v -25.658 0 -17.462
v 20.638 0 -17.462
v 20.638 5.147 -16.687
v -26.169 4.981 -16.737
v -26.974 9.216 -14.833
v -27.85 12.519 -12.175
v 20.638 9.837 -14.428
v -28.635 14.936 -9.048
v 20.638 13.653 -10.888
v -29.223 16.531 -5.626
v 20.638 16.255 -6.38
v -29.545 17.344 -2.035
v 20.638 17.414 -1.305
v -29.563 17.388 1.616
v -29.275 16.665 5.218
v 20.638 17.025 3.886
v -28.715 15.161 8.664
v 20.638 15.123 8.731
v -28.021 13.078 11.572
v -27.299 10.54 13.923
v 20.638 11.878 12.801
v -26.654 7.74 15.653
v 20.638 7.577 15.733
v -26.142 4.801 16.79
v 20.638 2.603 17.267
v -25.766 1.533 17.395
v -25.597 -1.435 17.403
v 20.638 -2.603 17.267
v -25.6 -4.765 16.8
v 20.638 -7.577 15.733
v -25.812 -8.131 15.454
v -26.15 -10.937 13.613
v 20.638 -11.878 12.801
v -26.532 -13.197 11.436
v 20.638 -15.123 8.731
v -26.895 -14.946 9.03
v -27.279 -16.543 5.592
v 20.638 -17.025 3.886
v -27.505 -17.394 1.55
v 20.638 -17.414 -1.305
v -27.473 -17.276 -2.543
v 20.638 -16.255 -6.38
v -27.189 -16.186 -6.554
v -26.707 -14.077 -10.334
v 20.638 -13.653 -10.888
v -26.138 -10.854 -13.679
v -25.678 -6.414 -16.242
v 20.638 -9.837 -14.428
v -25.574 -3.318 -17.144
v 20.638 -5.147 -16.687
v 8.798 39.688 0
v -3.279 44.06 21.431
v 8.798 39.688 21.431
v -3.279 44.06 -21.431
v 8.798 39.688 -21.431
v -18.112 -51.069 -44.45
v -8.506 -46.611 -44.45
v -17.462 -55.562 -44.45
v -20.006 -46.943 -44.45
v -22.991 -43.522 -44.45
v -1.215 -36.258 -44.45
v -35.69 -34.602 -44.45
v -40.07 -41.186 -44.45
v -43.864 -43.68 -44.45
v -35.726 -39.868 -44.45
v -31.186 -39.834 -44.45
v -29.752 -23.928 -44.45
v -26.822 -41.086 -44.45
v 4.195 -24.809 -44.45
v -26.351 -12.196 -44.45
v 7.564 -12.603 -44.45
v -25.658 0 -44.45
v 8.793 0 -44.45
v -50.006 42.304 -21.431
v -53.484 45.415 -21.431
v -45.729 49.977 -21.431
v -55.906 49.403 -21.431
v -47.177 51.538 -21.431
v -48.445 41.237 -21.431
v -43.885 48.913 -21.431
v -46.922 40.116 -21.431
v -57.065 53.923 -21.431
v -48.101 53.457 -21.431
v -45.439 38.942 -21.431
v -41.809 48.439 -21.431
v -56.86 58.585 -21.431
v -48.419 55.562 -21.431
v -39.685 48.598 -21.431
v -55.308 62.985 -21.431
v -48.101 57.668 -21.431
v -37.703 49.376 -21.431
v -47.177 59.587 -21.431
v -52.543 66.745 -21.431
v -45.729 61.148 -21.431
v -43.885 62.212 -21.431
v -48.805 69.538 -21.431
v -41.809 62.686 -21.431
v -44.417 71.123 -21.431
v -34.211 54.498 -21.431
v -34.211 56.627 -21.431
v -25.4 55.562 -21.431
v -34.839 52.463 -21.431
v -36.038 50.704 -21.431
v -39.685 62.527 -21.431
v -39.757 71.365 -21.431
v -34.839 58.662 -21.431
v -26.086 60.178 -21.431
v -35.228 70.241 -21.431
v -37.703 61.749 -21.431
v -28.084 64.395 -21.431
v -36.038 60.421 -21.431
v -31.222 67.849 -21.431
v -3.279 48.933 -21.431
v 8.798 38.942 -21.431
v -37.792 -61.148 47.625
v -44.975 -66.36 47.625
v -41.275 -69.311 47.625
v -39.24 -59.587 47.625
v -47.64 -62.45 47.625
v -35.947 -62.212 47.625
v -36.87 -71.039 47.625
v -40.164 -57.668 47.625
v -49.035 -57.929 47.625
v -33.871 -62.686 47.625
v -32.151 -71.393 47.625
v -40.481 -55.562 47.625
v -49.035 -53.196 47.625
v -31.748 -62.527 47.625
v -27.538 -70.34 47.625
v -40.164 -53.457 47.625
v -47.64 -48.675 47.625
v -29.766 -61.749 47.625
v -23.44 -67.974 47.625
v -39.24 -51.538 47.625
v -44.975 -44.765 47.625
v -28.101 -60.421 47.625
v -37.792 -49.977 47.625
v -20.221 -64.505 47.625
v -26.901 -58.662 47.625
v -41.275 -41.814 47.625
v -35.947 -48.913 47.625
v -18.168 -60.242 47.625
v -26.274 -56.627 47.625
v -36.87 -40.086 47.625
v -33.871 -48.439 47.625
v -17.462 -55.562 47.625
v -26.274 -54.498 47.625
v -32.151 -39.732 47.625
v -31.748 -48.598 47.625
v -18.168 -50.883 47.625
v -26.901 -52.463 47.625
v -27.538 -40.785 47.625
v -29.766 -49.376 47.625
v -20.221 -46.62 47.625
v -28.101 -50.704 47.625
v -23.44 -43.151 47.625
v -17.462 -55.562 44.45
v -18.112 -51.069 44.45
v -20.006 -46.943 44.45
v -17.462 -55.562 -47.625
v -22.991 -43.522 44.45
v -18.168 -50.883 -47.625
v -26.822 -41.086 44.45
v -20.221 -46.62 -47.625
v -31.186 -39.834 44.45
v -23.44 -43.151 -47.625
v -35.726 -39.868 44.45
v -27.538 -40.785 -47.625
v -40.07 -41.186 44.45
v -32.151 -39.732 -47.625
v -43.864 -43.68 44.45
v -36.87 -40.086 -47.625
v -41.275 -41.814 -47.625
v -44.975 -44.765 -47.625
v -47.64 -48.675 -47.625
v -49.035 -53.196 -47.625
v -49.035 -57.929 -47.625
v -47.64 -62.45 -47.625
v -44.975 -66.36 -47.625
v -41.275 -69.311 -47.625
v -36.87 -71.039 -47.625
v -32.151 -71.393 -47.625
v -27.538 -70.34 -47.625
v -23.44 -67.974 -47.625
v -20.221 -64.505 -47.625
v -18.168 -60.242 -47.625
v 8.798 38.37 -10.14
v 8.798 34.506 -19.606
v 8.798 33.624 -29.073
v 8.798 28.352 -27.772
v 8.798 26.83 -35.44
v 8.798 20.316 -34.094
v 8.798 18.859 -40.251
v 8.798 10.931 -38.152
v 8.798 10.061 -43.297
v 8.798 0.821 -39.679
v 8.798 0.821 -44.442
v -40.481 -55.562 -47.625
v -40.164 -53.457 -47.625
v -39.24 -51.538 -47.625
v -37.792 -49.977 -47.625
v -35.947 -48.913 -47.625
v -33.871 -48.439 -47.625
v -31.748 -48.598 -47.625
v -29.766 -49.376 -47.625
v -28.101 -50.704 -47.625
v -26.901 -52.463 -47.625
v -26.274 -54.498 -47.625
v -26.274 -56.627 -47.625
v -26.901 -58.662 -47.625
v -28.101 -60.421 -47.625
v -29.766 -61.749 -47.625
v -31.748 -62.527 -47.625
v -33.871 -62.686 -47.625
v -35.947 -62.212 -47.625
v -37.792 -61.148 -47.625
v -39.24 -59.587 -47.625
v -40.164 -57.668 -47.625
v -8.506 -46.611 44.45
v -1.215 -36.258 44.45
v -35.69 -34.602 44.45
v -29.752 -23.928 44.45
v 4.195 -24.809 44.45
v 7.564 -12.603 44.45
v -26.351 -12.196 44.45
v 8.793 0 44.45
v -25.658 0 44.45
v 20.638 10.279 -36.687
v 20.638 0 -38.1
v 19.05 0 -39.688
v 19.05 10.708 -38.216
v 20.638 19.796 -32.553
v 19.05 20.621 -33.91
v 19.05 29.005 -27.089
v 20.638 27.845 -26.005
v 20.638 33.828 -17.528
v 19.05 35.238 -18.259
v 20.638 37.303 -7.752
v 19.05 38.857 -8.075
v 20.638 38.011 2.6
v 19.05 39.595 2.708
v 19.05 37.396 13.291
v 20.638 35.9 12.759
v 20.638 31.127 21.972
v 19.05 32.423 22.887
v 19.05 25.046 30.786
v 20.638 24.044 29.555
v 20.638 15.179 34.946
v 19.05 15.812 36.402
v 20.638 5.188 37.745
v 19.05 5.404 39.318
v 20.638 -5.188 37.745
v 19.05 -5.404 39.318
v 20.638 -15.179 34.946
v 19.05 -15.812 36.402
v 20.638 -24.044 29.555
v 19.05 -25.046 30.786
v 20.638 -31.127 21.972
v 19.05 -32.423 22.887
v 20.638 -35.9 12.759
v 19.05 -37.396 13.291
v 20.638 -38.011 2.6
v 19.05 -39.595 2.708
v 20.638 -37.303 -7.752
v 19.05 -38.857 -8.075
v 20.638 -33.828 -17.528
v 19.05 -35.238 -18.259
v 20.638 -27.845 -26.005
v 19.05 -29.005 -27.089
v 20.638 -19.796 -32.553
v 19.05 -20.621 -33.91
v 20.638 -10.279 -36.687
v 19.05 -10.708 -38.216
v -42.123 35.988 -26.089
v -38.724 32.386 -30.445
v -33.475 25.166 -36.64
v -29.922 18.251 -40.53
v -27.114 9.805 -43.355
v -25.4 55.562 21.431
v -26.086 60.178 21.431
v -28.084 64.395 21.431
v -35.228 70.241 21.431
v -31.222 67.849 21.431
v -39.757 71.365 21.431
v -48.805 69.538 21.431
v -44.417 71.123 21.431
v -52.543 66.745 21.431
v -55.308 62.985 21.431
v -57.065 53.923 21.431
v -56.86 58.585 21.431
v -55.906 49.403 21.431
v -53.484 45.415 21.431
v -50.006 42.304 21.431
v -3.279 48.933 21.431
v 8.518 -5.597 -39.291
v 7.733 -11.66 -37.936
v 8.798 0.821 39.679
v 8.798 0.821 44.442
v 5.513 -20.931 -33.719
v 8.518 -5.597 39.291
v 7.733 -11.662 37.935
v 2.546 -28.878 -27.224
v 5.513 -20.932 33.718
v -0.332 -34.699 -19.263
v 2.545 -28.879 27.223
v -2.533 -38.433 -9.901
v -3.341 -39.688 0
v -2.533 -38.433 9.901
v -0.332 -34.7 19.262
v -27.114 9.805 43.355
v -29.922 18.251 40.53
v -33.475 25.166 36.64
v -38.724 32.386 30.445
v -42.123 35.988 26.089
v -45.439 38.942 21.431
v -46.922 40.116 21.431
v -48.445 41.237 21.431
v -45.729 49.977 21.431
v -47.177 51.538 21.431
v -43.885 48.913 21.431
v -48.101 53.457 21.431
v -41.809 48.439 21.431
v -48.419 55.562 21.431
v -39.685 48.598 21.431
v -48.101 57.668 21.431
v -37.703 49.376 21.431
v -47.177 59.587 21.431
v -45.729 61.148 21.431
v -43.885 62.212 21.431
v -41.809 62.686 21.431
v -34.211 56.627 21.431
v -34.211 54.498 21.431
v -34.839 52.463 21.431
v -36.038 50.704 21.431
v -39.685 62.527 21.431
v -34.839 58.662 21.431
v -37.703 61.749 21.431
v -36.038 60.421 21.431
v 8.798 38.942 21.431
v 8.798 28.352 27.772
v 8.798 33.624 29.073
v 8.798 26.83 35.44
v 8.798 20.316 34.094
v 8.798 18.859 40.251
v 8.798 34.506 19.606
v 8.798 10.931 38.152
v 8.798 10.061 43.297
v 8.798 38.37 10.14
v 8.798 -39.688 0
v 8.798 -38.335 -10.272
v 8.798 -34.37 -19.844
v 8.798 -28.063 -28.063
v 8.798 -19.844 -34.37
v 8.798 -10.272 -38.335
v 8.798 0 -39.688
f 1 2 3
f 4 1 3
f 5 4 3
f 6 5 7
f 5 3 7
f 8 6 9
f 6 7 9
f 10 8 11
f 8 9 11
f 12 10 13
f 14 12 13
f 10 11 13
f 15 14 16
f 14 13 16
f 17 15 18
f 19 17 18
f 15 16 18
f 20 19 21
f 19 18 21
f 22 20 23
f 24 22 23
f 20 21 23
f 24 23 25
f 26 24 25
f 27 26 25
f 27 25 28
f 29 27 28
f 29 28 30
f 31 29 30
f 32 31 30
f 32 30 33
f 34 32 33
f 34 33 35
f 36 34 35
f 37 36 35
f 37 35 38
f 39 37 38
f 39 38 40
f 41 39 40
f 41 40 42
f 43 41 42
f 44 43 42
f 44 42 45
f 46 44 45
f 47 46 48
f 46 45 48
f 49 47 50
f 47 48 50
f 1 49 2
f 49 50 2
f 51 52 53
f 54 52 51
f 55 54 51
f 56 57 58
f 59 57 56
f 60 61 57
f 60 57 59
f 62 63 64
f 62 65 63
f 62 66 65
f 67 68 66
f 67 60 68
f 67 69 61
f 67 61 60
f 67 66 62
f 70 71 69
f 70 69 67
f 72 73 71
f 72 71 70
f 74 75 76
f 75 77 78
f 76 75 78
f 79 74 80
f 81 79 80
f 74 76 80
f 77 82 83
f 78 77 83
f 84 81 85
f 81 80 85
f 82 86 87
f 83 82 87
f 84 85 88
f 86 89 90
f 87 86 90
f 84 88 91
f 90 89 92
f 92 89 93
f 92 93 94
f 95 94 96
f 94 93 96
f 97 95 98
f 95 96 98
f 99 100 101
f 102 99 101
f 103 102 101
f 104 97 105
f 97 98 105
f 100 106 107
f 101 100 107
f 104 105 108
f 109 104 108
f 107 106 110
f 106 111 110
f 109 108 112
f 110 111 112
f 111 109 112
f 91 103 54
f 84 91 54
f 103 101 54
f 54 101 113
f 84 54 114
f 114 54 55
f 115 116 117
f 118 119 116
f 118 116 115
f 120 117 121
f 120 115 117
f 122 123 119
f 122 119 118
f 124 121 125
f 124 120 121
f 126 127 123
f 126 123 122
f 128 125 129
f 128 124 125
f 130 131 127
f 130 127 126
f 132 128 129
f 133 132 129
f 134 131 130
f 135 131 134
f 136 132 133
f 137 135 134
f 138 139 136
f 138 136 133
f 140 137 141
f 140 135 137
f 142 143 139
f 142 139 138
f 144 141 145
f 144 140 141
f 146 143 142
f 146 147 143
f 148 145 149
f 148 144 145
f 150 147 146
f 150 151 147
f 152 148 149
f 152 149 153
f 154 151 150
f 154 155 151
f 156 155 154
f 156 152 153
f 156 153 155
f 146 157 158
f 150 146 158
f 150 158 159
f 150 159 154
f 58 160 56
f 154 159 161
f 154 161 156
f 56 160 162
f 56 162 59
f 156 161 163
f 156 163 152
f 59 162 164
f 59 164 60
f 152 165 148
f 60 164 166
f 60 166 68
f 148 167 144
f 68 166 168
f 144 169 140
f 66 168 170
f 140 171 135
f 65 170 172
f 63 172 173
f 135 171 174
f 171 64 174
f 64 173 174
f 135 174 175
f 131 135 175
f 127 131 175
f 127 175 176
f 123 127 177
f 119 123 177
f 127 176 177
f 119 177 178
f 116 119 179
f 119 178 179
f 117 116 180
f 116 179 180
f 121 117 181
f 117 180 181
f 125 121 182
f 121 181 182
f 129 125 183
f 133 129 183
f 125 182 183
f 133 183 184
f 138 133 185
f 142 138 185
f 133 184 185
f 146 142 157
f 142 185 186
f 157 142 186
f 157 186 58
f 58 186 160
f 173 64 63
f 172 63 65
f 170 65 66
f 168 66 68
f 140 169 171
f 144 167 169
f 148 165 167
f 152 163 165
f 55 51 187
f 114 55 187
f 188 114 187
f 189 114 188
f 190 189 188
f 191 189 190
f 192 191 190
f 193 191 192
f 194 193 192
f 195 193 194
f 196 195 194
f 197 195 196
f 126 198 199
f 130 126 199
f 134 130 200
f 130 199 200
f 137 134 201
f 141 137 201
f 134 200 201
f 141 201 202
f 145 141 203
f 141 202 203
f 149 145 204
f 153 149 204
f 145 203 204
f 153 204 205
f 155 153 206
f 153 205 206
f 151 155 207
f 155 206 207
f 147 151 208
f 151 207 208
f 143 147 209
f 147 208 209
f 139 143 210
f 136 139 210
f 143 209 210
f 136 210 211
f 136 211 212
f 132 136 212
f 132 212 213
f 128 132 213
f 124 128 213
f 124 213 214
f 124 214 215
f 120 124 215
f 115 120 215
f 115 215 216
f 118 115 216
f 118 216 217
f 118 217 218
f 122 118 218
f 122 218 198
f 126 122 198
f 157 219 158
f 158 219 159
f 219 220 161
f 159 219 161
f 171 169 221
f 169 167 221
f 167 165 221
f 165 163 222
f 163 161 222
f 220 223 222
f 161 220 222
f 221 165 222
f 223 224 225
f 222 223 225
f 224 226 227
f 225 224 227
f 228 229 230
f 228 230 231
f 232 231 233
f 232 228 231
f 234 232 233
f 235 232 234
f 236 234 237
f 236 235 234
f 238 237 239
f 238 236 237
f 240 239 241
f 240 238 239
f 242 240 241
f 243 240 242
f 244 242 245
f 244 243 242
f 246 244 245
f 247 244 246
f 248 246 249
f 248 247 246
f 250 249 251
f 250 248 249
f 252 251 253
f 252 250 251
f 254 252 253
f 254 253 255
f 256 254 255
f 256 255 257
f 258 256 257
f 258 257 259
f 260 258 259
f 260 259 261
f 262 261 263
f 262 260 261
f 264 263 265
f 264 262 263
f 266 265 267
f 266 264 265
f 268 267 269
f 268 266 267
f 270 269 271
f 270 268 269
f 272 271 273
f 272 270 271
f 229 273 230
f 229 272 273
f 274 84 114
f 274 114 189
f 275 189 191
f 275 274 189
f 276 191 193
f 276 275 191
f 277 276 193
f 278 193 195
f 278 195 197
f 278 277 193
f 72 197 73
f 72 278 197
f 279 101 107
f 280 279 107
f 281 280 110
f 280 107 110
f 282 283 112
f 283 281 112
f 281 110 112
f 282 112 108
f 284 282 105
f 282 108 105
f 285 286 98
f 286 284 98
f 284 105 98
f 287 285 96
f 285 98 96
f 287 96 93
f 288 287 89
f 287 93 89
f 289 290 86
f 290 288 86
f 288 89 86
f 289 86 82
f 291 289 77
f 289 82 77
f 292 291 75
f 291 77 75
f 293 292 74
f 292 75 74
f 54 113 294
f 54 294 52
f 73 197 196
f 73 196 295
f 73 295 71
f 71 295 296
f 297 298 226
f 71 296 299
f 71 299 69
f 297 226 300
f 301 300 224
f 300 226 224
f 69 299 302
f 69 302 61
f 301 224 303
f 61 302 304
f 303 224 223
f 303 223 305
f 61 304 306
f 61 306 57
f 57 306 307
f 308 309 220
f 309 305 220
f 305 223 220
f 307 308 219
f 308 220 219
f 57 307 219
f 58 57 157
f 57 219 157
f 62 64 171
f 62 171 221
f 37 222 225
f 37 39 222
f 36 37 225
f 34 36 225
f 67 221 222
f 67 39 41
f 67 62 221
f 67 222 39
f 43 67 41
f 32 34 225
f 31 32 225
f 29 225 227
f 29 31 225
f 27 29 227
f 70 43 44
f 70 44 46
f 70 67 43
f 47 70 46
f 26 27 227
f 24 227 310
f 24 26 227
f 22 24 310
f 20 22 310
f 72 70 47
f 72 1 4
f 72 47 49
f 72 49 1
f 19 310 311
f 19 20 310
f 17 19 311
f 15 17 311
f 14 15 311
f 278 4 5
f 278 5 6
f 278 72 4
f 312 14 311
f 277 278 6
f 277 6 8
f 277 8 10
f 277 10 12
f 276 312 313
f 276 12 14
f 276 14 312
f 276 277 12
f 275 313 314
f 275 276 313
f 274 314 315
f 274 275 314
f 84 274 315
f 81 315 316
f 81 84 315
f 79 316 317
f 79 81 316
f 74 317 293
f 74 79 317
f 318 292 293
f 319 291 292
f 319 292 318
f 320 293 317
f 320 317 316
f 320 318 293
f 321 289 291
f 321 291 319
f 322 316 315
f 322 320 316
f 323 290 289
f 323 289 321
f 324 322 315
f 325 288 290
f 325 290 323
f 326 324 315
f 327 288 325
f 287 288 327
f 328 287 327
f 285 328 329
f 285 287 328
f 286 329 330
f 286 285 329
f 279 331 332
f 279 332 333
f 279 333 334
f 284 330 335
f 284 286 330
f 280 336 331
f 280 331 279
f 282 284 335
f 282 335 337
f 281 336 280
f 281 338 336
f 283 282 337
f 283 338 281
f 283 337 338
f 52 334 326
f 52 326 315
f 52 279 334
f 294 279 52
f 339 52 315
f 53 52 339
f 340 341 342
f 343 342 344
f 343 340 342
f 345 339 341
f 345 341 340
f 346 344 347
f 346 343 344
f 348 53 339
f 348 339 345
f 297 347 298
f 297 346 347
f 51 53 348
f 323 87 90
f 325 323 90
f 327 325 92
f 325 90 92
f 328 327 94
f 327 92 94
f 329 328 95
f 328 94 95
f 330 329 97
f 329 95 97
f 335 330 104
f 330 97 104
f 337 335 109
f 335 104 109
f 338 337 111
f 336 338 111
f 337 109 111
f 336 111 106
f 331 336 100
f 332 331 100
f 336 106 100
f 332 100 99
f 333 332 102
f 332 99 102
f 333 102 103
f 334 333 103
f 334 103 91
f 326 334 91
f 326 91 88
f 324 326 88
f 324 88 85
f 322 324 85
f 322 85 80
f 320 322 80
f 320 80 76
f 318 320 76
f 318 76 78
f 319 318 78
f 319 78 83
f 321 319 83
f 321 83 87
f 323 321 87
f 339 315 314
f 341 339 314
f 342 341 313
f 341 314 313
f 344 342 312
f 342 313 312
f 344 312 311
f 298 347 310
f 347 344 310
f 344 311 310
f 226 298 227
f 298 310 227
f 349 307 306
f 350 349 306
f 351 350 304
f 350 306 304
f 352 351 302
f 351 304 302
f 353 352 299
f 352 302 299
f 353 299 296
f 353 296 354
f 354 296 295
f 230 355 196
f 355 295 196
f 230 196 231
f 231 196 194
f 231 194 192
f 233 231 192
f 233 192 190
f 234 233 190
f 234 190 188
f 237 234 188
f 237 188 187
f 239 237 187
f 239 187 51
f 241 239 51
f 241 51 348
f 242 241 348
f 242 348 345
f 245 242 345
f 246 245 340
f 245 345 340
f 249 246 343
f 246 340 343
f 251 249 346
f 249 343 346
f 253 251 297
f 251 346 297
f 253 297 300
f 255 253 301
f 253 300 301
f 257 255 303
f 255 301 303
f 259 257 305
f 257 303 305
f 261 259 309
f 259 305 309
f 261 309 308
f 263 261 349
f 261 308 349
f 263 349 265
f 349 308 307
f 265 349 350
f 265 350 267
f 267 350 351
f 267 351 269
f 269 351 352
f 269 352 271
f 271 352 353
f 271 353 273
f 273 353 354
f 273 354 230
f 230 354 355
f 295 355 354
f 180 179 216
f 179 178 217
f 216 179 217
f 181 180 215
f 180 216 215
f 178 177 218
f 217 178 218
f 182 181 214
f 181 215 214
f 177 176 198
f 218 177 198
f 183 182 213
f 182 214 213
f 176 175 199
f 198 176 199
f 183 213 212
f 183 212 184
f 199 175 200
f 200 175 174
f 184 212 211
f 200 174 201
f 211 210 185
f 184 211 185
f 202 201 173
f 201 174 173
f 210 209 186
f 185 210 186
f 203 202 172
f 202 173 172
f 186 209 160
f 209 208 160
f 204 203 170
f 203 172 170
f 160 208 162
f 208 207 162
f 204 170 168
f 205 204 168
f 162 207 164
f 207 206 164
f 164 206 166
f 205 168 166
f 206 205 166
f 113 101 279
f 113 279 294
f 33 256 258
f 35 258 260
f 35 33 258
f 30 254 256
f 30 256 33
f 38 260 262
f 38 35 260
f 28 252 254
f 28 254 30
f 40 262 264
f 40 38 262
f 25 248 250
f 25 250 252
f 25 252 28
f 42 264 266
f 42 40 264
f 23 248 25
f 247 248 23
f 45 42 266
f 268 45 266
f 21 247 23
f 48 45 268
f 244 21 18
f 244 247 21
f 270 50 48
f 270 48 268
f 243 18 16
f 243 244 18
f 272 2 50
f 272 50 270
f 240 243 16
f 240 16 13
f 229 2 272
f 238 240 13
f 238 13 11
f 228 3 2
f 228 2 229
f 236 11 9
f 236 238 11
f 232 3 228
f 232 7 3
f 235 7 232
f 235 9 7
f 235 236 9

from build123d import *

# Parameters (mm, degrees)
EXTRUDE1_DEPTH                 = 20.6375
EXTRUDE1_DEPTH_BACK            = 20.6375
SKETCH1_R                      = 39.6875
EXTRUDE2_DEPTH                 = 47.625
EXTRUDE2_DEPTH_BACK            = 47.625
SKETCH2_R                      = 15.875
EXTRUDE3_DEPTH                 = 21.43125
EXTRUDE3_DEPTH_BACK            = 21.43125
SKETCH3_R                      = 15.875
EXTRUDE4_DEPTH                 = 44.45
EXTRUDE4_DEPTH_BACK            = 44.45
EXTRUDE5_DEPTH                 = 104.138642279
EXTRUDE5_DEPTH_BACK            = 104.138642279
SKETCH7_R                      = 17.4625
EXTRUDE6_DEPTH                 = 116.854875545
F_9_16_0_5625_DIAMETER_HOLE1_D = 14.2875
F_9_16_0_5625_DIAMETER_HOLE2_D = 14.2875
CHAMFER1_SIZE                  = 1.5875
FILLET1_R                      = 73.66


with BuildPart() as part:
    # Sketch1 → Extrude1 (new, two sides: drawn at the far end of the back side and taken through both)
    with BuildSketch(Plane(origin=(0, 0, 0), x_dir=(0, 0, -1), z_dir=(1, 0, 0)).offset(-EXTRUDE1_DEPTH_BACK)):
        Circle(SKETCH1_R)
    extrude(amount=EXTRUDE1_DEPTH + EXTRUDE1_DEPTH_BACK)



with BuildPart() as body_2:
    # Sketch2 → Extrude2 (new, two sides: drawn at the far end of the back side and taken through both)
    with BuildSketch(Plane.XY.offset(-EXTRUDE2_DEPTH_BACK)):
        with Locations((-33.3375, -55.5625)):
            Circle(SKETCH2_R)
    extrude(amount=EXTRUDE2_DEPTH + EXTRUDE2_DEPTH_BACK)


with BuildPart() as body_3:
    # Sketch3 → Extrude3 (new, two sides: drawn at the far end of the back side and taken through both)
    with BuildSketch(Plane.XY.offset(-EXTRUDE3_DEPTH_BACK)):
        with Locations((-41.275, 55.5625)):
            Circle(SKETCH3_R)
    extrude(amount=EXTRUDE3_DEPTH + EXTRUDE3_DEPTH_BACK)


with BuildPart() as part_1:
    add(part.part)

    add(body_2.part)  # Extrude4 merges body 2

    add(body_3.part)  # Extrude4 merges body 3
    # Sketch4 → Extrude4 (add, two sides: drawn at the far end of the back side and taken through both)
    with BuildSketch(Plane.XY.offset(-EXTRUDE4_DEPTH_BACK)):
        with BuildLine():
            Line((-50.00589462, 42.304027081), (-25.4, 55.5625))
            Line((-25.4, 55.5625), (-3.279393891, 48.933263541))
            Line((-3.279393891, 48.933263541), (-3.279393891, 44.059515259))
            Line((-3.279393891, 44.059515259), (8.797943446, 39.6875))
            Line((8.797943446, 39.6875), (8.797943446, -39.6875))
            Line((8.797943446, -39.6875), (-17.4625, -55.5625))
            Line((-17.4625, -55.5625), (-43.864209099, -43.679570204))
            ThreePointArc((-43.864209099, -43.679570204), (-25.711027758, 0.82823016), (-50.00589462, 42.304027081))
        make_face()
    extrude(amount=EXTRUDE4_DEPTH + EXTRUDE4_DEPTH_BACK)

    # Sketch6 → Extrude5 (cut, two sides: drawn at the far end of the back side and taken through both)
    with BuildSketch(Plane(origin=(0, 0, 0), x_dir=(0, 0, -1), z_dir=(1, 0, 0)).offset(-EXTRUDE5_DEPTH_BACK)):
        with BuildLine():
            Line((-21.43125, 55.5625), (-21.43125, 38.942316616))
            ThreePointArc((-21.43125, 38.942316616), (-38.265007268, 22.618393372), (-44.45, 0))
            Line((-44.45, 0), (-44.45, 55.5625))
            Line((-44.45, 55.5625), (-21.43125, 55.5625))
        make_face()
        with BuildLine():
            Line((21.43125, 55.5625), (21.43125, 38.942316616))
            ThreePointArc((21.43125, 38.942316616), (38.265007268, 22.618393372), (44.45, 0))
            Line((44.45, 0), (44.45, 55.5625))
            Line((44.45, 55.5625), (21.43125, 55.5625))
        make_face()
    extrude(amount=EXTRUDE5_DEPTH + EXTRUDE5_DEPTH_BACK, mode=Mode.SUBTRACT)

    # Sketch7 → Extrude6 (cut, through all)
    with BuildSketch(Plane(origin=(20.6375, 0, 0), x_dir=(0, 0, -1), z_dir=(1, 0, 0))):
        Circle(SKETCH7_R)
    extrude(amount=-EXTRUDE6_DEPTH, mode=Mode.SUBTRACT)

    # 9/16 (0.5625) Diameter Hole1 (through all)
    with Locations(Plane.XY.offset(47.625)):
        with Locations((-33.3375, -55.5625)):
            Hole(F_9_16_0_5625_DIAMETER_HOLE1_D / 2)

    # 9/16 (0.5625) Diameter Hole2 (through all)
    with Locations(Plane.XY.offset(21.43125)):
        with Locations((-41.275, 55.5625)):
            Hole(F_9_16_0_5625_DIAMETER_HOLE2_D / 2)

    # Chamfer1
    chamfer1_edges = [part_1.edges().sort_by_distance(p)[0] for p in [
        (20.6375, 0, 39.6875),
    ]]
    chamfer(chamfer1_edges, length=CHAMFER1_SIZE)

    # Fillet1
    # the kernel refuses this fillet: 73.66 mm, written as the material it takes off along each edge
    with BuildSketch(Plane(origin=(8.797943446, -39.6875, 145.720774821), x_dir=(0, 1, 0), z_dir=(0, 0, -1))) as fillet1_piece_1_section:
        with BuildLine():
            CenterArc((40.508309928, -73.66), FILLET1_R, 90, 49.947360456)
            Line((-15.875, -26.260443446), (0, 0))
            Line((0, 0), (40.508309928, 0))
        make_face()
    fillet1_piece_1 = extrude(amount=145.720774821, mode=Mode.PRIVATE)
    fillet1_piece_1 = fillet1_piece_1 - Plane(origin=(8.797943446, 0, 0), x_dir=(0, 0, -1), z_dir=(-1, 0, 0)) * Cylinder(39.6875, 454, mode=Mode.PRIVATE)
    add(fillet1_piece_1, mode=Mode.SUBTRACT)
    with BuildSketch(Plane(origin=(8.797943446, -39.6875, 0), x_dir=(0, 1, 0), z_dir=(0, 0, -1))) as fillet1_piece_2_section:
        with BuildLine():
            CenterArc((40.508309928, -73.66), FILLET1_R, 90, 49.947360456)
            Line((-15.875, -26.260443446), (0, 0))
            Line((0, 0), (40.508309928, 0))
        make_face()
    fillet1_piece_2 = extrude(amount=145.720774821, mode=Mode.PRIVATE)
    fillet1_piece_2 = fillet1_piece_2 - Plane(origin=(8.797943446, 0, 0), x_dir=(0, 0, -1), z_dir=(-1, 0, 0)) * Cylinder(39.6875, 454, mode=Mode.PRIVATE)
    add(fillet1_piece_2, mode=Mode.SUBTRACT)


solid = part_1.part
